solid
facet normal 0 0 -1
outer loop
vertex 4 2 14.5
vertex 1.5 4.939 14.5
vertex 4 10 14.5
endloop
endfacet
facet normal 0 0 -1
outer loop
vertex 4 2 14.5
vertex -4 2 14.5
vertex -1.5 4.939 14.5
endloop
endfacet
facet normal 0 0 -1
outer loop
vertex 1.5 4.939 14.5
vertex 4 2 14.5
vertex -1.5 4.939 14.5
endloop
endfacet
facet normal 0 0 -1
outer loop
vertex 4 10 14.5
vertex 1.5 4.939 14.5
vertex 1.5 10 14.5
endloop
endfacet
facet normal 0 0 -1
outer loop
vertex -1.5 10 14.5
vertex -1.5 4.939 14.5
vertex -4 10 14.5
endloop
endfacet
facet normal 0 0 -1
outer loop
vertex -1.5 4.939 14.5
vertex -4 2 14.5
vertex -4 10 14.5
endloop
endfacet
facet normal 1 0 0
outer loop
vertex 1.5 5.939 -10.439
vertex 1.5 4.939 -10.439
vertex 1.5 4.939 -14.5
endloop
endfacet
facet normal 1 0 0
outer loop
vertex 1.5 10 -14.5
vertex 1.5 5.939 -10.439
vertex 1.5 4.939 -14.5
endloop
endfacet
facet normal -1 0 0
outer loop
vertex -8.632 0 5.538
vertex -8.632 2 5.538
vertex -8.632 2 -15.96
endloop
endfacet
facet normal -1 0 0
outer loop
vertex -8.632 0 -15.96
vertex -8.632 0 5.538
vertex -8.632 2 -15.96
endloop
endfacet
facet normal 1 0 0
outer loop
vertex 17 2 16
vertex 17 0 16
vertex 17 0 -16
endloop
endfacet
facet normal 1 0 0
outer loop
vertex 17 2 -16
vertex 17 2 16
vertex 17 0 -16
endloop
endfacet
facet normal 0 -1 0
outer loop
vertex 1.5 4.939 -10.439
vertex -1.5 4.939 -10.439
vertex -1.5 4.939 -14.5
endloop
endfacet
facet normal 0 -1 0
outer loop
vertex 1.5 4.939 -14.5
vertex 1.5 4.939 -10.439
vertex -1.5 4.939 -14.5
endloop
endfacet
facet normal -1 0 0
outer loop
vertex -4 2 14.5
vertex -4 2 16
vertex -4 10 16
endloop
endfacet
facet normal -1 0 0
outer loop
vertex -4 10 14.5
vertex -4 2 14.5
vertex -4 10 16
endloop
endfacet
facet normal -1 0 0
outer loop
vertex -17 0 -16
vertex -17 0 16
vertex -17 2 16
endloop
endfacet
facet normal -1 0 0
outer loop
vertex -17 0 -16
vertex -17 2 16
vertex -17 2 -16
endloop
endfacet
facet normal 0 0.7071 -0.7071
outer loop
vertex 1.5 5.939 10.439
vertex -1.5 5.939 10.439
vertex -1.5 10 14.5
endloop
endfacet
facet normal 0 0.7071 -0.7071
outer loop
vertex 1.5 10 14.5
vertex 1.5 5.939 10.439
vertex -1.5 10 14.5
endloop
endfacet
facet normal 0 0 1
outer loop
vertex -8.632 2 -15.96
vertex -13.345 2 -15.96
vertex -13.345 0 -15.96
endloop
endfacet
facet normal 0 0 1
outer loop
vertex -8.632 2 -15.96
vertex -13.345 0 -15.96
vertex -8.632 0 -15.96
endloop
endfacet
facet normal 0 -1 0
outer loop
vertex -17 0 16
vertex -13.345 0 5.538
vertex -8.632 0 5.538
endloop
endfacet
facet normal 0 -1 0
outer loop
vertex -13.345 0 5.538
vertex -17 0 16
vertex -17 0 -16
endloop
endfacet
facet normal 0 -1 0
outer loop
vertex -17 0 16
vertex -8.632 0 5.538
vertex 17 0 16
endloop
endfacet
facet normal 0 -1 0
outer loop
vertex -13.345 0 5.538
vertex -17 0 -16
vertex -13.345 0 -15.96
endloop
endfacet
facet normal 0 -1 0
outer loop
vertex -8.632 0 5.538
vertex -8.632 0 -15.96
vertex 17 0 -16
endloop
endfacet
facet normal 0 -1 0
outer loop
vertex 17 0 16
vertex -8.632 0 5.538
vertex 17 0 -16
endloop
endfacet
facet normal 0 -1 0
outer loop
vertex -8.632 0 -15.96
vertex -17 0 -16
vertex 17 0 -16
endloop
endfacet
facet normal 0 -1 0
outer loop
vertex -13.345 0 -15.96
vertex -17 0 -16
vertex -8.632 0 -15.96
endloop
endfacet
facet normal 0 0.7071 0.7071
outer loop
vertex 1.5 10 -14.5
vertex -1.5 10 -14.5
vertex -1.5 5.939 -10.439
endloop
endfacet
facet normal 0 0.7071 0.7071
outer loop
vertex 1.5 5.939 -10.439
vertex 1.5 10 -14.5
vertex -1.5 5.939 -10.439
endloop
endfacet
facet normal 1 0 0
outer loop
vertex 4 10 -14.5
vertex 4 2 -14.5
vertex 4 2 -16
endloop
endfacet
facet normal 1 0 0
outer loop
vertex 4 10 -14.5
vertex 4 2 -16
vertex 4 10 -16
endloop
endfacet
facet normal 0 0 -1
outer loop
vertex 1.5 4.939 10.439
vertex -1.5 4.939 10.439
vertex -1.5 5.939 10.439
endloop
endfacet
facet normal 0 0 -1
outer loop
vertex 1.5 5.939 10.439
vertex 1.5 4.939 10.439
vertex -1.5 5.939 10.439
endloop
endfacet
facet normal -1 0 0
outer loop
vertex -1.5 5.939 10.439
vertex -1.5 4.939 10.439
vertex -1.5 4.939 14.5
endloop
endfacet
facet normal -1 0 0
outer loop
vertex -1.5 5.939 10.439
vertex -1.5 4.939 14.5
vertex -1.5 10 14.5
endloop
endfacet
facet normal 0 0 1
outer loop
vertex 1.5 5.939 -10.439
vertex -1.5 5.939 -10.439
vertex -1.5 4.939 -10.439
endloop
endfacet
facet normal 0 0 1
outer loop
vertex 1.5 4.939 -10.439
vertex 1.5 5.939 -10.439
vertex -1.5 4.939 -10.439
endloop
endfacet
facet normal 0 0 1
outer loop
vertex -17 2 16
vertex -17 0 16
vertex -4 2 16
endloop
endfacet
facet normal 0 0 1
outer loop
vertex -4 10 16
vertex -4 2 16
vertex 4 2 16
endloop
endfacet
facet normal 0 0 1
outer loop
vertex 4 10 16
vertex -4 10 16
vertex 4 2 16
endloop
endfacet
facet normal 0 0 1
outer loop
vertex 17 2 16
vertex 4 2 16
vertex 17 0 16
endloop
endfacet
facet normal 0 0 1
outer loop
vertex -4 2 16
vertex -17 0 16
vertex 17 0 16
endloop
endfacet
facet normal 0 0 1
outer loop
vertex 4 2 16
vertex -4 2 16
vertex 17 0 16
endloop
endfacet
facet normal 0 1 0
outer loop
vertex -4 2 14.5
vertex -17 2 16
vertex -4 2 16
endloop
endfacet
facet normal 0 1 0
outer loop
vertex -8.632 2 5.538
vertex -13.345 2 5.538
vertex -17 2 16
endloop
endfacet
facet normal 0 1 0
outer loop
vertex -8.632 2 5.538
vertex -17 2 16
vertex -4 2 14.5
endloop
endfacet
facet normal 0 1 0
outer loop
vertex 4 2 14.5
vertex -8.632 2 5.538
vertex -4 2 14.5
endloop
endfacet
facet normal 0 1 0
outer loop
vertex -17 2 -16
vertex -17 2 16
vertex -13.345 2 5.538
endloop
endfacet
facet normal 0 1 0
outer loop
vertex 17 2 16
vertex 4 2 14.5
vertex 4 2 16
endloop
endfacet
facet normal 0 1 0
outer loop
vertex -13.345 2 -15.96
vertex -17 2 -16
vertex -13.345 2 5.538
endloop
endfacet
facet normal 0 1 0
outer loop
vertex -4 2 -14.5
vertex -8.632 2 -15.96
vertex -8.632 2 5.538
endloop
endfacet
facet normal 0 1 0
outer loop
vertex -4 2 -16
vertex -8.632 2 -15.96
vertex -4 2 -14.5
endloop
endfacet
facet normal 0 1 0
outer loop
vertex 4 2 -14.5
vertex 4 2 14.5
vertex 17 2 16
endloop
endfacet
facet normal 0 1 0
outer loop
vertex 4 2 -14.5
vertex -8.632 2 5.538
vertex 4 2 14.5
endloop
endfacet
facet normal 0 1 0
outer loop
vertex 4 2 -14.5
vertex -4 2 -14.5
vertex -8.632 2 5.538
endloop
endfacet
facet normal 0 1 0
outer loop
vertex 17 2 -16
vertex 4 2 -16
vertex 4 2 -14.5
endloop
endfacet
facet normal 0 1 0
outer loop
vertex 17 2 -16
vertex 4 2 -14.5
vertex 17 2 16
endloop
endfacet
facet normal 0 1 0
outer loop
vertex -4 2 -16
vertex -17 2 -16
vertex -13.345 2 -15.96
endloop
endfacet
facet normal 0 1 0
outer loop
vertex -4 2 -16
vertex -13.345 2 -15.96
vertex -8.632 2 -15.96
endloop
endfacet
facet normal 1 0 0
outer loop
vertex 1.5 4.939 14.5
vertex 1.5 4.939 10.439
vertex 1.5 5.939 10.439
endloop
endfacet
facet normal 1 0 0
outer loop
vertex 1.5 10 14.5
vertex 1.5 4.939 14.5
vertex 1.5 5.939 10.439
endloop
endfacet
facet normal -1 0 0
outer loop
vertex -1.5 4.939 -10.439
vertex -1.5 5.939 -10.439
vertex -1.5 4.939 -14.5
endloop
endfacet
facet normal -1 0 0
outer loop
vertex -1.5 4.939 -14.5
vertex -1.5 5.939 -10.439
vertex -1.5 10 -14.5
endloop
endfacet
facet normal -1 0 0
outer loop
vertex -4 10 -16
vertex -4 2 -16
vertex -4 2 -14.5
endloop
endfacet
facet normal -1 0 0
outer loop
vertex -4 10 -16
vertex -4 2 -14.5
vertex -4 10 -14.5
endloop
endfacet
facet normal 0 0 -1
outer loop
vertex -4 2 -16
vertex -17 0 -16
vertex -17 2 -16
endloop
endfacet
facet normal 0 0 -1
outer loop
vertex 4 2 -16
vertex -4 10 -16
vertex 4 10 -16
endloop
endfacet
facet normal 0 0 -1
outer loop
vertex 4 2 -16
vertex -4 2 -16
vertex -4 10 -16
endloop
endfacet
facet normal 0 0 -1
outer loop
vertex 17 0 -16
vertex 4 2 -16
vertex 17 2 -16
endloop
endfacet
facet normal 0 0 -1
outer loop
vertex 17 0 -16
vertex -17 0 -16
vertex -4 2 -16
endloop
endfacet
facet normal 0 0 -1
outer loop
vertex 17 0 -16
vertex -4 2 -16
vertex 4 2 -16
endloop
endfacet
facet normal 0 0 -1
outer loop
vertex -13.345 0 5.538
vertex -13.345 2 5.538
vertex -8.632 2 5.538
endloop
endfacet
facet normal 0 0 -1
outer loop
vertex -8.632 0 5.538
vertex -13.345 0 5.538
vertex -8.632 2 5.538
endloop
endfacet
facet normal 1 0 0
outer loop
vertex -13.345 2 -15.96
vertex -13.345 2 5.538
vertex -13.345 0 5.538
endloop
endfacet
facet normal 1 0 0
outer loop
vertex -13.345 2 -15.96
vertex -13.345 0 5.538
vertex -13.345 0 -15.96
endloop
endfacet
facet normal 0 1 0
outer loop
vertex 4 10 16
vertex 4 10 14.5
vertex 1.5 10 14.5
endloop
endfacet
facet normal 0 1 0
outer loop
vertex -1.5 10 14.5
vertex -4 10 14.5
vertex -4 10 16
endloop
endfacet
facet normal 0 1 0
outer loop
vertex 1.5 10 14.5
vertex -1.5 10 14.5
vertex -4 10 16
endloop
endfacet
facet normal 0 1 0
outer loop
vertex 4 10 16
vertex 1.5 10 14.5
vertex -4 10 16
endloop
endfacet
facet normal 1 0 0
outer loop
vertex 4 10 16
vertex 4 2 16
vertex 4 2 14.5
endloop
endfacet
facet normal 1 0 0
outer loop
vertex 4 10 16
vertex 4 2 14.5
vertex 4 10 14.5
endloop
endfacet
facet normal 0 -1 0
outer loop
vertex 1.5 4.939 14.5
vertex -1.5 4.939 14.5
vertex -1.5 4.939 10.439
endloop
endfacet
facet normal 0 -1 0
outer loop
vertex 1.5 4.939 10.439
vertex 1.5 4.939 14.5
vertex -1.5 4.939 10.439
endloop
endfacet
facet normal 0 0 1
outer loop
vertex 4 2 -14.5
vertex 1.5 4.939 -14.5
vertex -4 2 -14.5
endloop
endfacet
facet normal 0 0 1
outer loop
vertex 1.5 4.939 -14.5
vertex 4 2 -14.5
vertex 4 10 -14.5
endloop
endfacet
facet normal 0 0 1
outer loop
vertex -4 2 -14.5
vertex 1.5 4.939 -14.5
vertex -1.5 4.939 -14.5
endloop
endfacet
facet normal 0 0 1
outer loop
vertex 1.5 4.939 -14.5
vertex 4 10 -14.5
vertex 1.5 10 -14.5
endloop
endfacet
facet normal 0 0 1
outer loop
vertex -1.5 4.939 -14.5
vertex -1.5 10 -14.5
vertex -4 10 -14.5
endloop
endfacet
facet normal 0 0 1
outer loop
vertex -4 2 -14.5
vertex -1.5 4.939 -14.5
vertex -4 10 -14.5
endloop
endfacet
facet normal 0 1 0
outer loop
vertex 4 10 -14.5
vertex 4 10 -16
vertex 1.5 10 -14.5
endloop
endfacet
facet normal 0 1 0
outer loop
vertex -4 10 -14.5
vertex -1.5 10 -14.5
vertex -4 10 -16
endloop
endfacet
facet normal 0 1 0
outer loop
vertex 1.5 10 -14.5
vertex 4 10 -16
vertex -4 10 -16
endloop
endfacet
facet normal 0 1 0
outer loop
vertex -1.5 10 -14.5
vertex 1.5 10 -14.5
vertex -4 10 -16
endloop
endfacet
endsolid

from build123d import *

# Parameters (mm, degrees)
SKETCH1_W           = 34
SKETCH1_H           = 32
BOSS_EXTRUDE1_DEPTH = 2
SKETCH4_W           = 4
SKETCH4_H           = 8
BOSS_EXTRUDE2_DEPTH = 1.5
BOSS_EXTRUDE5_DEPTH = 1.5
MIRROR1_START       = -4
MIRROR1_OUTLINE_W   = 8
MIRROR1_OUTLINE_H   = 1.5
MIRROR1_DEPTH       = 8
MIRROR1_START_2     = -1.5
MIRROR1_2_DEPTH     = 3
SKETCH7_W           = 4.713008878
SKETCH7_H           = 21.4981103
CUT_EXTRUDE1_DEPTH  = 7.5


# Read off the part's stored shape, not the designer's step: Mirror1
with BuildPart() as part:
    # Sketch1 → Boss-Extrude1 (new body)
    with BuildSketch(Plane(origin=(0, 0, 0), x_dir=(1, 0, 0), z_dir=(0, 1, 0))):
        Rectangle(SKETCH1_W, SKETCH1_H)
    extrude(amount=BOSS_EXTRUDE1_DEPTH)

    # Sketch4 → Boss-Extrude2 (add)
    with BuildSketch(Plane(origin=(0, 0, -16), x_dir=(-1, 0, 0), z_dir=(0, 0, -1))):
        with Locations((2, 6)):
            Rectangle(SKETCH4_W, SKETCH4_H)
    extrude(amount=-BOSS_EXTRUDE2_DEPTH)

    # Sketch5 → Boss-Extrude5 (add)
    with BuildSketch(Plane(origin=(0, 0, 0), x_dir=(0, 0, -1), z_dir=(1, 0, 0))):
        Polygon((14.5, 10), (10.439339828, 5.939339828), (10.439339828, 4.939339828), (14.5, 4.939339828), (14.5, 2), (16, 2), (16, 10), align=None)
    extrude(amount=-BOSS_EXTRUDE5_DEPTH)

    # Mirror1 outline → Mirror1 (add)
    with BuildSketch(Plane.YZ.offset(MIRROR1_START)):
        with Locations((6, 15.25)):
            Rectangle(MIRROR1_OUTLINE_W, MIRROR1_OUTLINE_H)
        with Locations((6, -15.25)):
            Rectangle(MIRROR1_OUTLINE_W, MIRROR1_OUTLINE_H)
    extrude(amount=MIRROR1_DEPTH)

    # Mirror1 2 outline → Mirror1 2 (add)
    with BuildSketch(Plane.YZ.offset(MIRROR1_START_2)):
        Polygon((4.939339828, -14.5), (10, -14.5), (5.939339828, -10.439339828), (4.939339828, -10.439339828), align=None)
        Polygon((10, 14.5), (4.939339828, 14.5), (4.939339828, 10.439339828), (5.939339828, 10.439339828), align=None)
    extrude(amount=MIRROR1_2_DEPTH)

    # Sketch7 → Cut-Extrude1 (cut)
    with BuildSketch(Plane(origin=(0, 2, 0), x_dir=(1, 0, 0), z_dir=(0, 1, 0))):
        with Locations((-10.988574464, 5.211128947)):
            Rectangle(SKETCH7_W, SKETCH7_H)
    extrude(amount=-CUT_EXTRUDE1_DEPTH, mode=Mode.SUBTRACT)


solid = part.part
